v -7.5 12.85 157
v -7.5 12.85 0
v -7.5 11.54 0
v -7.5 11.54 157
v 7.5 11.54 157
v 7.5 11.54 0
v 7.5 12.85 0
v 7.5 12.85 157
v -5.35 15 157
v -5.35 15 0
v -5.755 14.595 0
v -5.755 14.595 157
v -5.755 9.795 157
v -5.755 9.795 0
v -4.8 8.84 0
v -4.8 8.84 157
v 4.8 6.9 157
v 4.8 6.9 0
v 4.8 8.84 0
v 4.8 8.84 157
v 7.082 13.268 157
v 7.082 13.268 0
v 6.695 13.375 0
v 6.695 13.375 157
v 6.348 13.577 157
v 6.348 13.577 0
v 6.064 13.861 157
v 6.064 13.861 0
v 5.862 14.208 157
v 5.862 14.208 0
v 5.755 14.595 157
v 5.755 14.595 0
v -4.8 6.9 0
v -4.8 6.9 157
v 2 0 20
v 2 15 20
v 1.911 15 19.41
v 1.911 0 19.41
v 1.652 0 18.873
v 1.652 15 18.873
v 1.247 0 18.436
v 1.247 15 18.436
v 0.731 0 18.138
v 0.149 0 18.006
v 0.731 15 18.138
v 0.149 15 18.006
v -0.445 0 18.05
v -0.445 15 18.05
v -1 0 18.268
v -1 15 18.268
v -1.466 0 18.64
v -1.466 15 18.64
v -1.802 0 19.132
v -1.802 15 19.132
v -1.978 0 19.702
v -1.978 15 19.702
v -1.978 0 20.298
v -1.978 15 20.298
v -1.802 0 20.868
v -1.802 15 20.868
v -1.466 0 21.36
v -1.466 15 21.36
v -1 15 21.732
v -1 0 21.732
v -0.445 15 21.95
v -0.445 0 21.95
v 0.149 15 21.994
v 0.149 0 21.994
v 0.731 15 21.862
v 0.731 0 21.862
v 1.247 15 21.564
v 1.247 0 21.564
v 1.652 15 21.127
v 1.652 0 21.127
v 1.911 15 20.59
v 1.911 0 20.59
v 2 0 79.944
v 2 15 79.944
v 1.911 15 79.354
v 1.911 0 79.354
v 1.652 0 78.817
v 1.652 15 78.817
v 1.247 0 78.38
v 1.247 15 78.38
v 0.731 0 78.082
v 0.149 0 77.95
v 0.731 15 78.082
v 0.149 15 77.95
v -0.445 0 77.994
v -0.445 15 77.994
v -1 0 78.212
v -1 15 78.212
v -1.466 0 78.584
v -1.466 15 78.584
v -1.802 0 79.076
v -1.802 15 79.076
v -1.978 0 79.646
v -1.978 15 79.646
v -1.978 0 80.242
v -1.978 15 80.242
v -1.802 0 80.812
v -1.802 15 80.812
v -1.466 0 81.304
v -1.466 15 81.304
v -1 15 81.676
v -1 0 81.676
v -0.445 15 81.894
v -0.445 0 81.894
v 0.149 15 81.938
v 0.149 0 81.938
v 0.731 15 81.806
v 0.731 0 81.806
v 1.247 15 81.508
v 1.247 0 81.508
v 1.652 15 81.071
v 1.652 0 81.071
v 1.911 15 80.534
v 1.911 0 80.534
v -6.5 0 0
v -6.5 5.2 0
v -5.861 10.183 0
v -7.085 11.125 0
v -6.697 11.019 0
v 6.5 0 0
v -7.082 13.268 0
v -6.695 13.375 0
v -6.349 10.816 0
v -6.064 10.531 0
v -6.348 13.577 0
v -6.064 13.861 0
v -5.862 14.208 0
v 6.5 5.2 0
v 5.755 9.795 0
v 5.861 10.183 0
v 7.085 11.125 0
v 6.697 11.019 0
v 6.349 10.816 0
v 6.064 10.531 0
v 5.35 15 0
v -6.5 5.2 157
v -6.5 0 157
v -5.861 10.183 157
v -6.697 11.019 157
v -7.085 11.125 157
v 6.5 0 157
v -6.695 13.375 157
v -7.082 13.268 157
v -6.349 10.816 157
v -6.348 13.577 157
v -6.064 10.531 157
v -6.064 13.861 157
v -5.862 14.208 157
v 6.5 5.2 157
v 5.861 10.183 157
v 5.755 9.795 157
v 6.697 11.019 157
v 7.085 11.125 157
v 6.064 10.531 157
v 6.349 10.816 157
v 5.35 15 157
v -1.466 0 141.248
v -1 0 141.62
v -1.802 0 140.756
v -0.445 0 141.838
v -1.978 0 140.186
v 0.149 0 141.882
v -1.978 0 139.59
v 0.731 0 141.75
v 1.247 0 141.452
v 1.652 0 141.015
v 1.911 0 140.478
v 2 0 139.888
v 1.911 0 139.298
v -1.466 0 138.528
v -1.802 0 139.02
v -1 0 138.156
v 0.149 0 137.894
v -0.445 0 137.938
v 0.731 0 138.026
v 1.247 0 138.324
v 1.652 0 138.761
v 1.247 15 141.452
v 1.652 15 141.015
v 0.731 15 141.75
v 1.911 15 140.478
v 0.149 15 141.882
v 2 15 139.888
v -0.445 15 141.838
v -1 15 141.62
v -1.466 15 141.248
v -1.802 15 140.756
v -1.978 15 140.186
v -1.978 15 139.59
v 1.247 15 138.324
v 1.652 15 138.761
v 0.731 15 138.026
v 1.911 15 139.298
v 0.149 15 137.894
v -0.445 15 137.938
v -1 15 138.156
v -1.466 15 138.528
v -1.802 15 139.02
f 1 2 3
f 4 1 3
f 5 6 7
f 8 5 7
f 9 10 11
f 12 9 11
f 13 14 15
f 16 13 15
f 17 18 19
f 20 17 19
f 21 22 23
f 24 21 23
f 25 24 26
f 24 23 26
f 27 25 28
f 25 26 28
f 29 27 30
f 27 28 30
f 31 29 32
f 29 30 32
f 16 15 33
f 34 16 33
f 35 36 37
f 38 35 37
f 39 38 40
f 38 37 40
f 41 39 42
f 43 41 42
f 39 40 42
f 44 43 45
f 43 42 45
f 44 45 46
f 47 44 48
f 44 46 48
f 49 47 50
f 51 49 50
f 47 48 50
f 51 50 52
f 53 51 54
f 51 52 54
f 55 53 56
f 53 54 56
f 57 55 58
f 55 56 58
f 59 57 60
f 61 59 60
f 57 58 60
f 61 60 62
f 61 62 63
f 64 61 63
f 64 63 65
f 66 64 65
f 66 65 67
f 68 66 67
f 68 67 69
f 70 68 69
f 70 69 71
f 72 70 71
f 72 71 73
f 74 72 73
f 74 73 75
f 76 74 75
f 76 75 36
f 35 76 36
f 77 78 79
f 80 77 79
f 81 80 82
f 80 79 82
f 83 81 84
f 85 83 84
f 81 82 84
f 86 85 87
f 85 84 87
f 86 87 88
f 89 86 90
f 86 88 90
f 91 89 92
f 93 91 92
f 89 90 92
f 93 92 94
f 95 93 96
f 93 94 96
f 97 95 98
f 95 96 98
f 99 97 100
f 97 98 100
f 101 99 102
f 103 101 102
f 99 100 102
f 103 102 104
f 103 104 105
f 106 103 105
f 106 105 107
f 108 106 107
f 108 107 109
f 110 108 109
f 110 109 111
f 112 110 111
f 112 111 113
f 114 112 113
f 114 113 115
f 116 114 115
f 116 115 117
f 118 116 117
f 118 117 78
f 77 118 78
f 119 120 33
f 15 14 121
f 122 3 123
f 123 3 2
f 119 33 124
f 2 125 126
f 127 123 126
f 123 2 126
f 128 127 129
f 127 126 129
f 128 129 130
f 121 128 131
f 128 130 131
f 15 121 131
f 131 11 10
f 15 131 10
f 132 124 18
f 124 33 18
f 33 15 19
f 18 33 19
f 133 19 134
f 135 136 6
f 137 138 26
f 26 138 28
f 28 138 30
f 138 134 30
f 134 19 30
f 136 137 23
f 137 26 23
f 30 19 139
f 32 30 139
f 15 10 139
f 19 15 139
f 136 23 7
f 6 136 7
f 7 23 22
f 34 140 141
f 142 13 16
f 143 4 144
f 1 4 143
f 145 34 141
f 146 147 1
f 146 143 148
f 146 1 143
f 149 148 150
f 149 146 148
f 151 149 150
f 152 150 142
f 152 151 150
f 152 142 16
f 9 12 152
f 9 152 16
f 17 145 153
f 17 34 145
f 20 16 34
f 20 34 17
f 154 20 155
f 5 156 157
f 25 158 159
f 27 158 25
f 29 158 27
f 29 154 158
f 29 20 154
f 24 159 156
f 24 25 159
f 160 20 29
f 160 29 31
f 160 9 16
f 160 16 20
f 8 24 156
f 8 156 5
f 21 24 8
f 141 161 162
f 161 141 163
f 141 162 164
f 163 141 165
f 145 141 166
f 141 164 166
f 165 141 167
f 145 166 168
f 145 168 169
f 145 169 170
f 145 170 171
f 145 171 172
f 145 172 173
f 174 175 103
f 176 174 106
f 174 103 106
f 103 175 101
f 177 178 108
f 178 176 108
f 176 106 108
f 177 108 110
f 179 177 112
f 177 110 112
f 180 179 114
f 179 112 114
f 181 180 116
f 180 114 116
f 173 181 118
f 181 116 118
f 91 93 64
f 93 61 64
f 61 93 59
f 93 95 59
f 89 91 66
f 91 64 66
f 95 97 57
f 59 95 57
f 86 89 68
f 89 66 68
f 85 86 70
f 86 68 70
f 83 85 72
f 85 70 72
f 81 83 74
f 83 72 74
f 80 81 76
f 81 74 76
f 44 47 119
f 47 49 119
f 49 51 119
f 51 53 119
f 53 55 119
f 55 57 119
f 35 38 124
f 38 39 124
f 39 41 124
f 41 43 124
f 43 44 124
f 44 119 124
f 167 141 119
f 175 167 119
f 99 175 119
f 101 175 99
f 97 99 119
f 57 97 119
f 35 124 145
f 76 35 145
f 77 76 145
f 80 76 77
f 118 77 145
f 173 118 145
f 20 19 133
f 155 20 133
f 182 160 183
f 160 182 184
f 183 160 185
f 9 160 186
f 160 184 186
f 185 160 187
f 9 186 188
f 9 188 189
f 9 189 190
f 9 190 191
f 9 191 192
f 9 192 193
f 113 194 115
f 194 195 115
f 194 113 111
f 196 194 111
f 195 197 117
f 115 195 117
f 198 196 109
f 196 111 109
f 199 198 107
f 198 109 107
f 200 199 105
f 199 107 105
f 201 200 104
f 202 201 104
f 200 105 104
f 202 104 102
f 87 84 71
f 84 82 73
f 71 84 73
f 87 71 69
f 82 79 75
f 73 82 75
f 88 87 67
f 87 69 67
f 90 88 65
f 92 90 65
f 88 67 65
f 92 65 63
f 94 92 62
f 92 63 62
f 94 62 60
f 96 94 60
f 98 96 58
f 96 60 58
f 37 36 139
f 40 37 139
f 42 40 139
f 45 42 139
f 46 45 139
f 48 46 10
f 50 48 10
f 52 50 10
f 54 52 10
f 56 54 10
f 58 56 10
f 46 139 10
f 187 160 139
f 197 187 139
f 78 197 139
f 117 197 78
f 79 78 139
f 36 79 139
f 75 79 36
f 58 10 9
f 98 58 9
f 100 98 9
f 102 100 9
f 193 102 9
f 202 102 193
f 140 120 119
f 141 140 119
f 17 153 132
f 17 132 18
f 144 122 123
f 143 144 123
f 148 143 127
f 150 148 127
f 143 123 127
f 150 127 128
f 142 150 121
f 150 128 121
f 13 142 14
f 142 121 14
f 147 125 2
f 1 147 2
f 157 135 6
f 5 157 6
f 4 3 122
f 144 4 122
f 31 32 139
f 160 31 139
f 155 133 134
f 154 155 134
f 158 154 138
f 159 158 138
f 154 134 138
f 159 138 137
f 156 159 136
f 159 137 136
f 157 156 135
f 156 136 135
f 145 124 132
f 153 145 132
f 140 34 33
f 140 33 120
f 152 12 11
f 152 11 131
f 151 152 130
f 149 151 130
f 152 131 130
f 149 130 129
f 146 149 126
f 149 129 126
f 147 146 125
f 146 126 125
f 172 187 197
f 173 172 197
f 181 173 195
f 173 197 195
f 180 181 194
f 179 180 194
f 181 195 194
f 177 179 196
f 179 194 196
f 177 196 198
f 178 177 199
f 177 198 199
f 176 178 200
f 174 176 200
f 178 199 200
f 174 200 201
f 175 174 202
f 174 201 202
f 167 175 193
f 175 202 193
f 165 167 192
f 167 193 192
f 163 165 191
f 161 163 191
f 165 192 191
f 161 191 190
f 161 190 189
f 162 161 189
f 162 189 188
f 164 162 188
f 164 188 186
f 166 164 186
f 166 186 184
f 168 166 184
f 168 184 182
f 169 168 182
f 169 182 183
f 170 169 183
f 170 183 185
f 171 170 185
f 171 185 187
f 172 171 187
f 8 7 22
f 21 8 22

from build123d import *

# Parameters (mm, degrees)
BOSS_EXTRUDE1_DEPTH = 156.99994
SKETCH2_R           = 2
CUT_EXTRUDE1_DEPTH  = 16


with BuildPart() as part:
    # Sketch1 → Boss-Extrude1 (new body)
    with BuildSketch(Plane.XY):
        with BuildLine():
            Line((-6.5, 0), (6.5, 0))
            Line((6.5, 0), (6.5, 5.2))
            Line((6.5, 5.2), (4.8, 6.9))
            Line((4.8, 6.9), (4.8, 8.84))
            Line((4.8, 8.84), (5.754868434, 9.794868434))
            ThreePointArc((5.754868434, 9.794868434), (6.196913421, 10.683086579), (7.085131566, 11.125131566))
            Line((7.085131566, 11.125131566), (7.5, 11.54))
            Line((7.5, 11.54), (7.5, 12.85))
            Line((7.5, 12.85), (7.08164233, 13.26835767))
            ThreePointArc((7.08164233, 13.26835767), (6.196913421, 13.709913421), (5.75535767, 14.59464233))
            Line((5.75535767, 14.59464233), (5.35, 15))
            Line((5.35, 15), (-5.35, 15))
            Line((-5.35, 15), (-5.75535767, 14.59464233))
            ThreePointArc((-5.75535767, 14.59464233), (-6.196913421, 13.709913421), (-7.08164233, 13.26835767))
            Line((-7.08164233, 13.26835767), (-7.5, 12.85))
            Line((-7.5, 12.85), (-7.5, 11.54))
            Line((-7.5, 11.54), (-7.085131566, 11.125131566))
            ThreePointArc((-7.085131566, 11.125131566), (-6.196913421, 10.683086579), (-5.754868434, 9.794868434))
            Line((-5.754868434, 9.794868434), (-4.8, 8.84))
            Line((-4.8, 8.84), (-4.8, 6.9))
            Line((-4.8, 6.9), (-6.5, 5.2))
            Line((-6.5, 5.2), (-6.5, 0))
        make_face()
    extrude(amount=BOSS_EXTRUDE1_DEPTH)

    # Sketch2 → Cut-Extrude1 (cut, through all)
    with BuildSketch(Plane(origin=(0, 15, 0), x_dir=(1, 0, 0), z_dir=(0, 1, 0))):
        with Locations((0, -20)):
            Circle(SKETCH2_R)
        with Locations((0, -79.944)):
            Circle(SKETCH2_R)
        with Locations((0, -139.888)):
            Circle(SKETCH2_R)
    extrude(amount=-CUT_EXTRUDE1_DEPTH, mode=Mode.SUBTRACT)


solid = part.part
